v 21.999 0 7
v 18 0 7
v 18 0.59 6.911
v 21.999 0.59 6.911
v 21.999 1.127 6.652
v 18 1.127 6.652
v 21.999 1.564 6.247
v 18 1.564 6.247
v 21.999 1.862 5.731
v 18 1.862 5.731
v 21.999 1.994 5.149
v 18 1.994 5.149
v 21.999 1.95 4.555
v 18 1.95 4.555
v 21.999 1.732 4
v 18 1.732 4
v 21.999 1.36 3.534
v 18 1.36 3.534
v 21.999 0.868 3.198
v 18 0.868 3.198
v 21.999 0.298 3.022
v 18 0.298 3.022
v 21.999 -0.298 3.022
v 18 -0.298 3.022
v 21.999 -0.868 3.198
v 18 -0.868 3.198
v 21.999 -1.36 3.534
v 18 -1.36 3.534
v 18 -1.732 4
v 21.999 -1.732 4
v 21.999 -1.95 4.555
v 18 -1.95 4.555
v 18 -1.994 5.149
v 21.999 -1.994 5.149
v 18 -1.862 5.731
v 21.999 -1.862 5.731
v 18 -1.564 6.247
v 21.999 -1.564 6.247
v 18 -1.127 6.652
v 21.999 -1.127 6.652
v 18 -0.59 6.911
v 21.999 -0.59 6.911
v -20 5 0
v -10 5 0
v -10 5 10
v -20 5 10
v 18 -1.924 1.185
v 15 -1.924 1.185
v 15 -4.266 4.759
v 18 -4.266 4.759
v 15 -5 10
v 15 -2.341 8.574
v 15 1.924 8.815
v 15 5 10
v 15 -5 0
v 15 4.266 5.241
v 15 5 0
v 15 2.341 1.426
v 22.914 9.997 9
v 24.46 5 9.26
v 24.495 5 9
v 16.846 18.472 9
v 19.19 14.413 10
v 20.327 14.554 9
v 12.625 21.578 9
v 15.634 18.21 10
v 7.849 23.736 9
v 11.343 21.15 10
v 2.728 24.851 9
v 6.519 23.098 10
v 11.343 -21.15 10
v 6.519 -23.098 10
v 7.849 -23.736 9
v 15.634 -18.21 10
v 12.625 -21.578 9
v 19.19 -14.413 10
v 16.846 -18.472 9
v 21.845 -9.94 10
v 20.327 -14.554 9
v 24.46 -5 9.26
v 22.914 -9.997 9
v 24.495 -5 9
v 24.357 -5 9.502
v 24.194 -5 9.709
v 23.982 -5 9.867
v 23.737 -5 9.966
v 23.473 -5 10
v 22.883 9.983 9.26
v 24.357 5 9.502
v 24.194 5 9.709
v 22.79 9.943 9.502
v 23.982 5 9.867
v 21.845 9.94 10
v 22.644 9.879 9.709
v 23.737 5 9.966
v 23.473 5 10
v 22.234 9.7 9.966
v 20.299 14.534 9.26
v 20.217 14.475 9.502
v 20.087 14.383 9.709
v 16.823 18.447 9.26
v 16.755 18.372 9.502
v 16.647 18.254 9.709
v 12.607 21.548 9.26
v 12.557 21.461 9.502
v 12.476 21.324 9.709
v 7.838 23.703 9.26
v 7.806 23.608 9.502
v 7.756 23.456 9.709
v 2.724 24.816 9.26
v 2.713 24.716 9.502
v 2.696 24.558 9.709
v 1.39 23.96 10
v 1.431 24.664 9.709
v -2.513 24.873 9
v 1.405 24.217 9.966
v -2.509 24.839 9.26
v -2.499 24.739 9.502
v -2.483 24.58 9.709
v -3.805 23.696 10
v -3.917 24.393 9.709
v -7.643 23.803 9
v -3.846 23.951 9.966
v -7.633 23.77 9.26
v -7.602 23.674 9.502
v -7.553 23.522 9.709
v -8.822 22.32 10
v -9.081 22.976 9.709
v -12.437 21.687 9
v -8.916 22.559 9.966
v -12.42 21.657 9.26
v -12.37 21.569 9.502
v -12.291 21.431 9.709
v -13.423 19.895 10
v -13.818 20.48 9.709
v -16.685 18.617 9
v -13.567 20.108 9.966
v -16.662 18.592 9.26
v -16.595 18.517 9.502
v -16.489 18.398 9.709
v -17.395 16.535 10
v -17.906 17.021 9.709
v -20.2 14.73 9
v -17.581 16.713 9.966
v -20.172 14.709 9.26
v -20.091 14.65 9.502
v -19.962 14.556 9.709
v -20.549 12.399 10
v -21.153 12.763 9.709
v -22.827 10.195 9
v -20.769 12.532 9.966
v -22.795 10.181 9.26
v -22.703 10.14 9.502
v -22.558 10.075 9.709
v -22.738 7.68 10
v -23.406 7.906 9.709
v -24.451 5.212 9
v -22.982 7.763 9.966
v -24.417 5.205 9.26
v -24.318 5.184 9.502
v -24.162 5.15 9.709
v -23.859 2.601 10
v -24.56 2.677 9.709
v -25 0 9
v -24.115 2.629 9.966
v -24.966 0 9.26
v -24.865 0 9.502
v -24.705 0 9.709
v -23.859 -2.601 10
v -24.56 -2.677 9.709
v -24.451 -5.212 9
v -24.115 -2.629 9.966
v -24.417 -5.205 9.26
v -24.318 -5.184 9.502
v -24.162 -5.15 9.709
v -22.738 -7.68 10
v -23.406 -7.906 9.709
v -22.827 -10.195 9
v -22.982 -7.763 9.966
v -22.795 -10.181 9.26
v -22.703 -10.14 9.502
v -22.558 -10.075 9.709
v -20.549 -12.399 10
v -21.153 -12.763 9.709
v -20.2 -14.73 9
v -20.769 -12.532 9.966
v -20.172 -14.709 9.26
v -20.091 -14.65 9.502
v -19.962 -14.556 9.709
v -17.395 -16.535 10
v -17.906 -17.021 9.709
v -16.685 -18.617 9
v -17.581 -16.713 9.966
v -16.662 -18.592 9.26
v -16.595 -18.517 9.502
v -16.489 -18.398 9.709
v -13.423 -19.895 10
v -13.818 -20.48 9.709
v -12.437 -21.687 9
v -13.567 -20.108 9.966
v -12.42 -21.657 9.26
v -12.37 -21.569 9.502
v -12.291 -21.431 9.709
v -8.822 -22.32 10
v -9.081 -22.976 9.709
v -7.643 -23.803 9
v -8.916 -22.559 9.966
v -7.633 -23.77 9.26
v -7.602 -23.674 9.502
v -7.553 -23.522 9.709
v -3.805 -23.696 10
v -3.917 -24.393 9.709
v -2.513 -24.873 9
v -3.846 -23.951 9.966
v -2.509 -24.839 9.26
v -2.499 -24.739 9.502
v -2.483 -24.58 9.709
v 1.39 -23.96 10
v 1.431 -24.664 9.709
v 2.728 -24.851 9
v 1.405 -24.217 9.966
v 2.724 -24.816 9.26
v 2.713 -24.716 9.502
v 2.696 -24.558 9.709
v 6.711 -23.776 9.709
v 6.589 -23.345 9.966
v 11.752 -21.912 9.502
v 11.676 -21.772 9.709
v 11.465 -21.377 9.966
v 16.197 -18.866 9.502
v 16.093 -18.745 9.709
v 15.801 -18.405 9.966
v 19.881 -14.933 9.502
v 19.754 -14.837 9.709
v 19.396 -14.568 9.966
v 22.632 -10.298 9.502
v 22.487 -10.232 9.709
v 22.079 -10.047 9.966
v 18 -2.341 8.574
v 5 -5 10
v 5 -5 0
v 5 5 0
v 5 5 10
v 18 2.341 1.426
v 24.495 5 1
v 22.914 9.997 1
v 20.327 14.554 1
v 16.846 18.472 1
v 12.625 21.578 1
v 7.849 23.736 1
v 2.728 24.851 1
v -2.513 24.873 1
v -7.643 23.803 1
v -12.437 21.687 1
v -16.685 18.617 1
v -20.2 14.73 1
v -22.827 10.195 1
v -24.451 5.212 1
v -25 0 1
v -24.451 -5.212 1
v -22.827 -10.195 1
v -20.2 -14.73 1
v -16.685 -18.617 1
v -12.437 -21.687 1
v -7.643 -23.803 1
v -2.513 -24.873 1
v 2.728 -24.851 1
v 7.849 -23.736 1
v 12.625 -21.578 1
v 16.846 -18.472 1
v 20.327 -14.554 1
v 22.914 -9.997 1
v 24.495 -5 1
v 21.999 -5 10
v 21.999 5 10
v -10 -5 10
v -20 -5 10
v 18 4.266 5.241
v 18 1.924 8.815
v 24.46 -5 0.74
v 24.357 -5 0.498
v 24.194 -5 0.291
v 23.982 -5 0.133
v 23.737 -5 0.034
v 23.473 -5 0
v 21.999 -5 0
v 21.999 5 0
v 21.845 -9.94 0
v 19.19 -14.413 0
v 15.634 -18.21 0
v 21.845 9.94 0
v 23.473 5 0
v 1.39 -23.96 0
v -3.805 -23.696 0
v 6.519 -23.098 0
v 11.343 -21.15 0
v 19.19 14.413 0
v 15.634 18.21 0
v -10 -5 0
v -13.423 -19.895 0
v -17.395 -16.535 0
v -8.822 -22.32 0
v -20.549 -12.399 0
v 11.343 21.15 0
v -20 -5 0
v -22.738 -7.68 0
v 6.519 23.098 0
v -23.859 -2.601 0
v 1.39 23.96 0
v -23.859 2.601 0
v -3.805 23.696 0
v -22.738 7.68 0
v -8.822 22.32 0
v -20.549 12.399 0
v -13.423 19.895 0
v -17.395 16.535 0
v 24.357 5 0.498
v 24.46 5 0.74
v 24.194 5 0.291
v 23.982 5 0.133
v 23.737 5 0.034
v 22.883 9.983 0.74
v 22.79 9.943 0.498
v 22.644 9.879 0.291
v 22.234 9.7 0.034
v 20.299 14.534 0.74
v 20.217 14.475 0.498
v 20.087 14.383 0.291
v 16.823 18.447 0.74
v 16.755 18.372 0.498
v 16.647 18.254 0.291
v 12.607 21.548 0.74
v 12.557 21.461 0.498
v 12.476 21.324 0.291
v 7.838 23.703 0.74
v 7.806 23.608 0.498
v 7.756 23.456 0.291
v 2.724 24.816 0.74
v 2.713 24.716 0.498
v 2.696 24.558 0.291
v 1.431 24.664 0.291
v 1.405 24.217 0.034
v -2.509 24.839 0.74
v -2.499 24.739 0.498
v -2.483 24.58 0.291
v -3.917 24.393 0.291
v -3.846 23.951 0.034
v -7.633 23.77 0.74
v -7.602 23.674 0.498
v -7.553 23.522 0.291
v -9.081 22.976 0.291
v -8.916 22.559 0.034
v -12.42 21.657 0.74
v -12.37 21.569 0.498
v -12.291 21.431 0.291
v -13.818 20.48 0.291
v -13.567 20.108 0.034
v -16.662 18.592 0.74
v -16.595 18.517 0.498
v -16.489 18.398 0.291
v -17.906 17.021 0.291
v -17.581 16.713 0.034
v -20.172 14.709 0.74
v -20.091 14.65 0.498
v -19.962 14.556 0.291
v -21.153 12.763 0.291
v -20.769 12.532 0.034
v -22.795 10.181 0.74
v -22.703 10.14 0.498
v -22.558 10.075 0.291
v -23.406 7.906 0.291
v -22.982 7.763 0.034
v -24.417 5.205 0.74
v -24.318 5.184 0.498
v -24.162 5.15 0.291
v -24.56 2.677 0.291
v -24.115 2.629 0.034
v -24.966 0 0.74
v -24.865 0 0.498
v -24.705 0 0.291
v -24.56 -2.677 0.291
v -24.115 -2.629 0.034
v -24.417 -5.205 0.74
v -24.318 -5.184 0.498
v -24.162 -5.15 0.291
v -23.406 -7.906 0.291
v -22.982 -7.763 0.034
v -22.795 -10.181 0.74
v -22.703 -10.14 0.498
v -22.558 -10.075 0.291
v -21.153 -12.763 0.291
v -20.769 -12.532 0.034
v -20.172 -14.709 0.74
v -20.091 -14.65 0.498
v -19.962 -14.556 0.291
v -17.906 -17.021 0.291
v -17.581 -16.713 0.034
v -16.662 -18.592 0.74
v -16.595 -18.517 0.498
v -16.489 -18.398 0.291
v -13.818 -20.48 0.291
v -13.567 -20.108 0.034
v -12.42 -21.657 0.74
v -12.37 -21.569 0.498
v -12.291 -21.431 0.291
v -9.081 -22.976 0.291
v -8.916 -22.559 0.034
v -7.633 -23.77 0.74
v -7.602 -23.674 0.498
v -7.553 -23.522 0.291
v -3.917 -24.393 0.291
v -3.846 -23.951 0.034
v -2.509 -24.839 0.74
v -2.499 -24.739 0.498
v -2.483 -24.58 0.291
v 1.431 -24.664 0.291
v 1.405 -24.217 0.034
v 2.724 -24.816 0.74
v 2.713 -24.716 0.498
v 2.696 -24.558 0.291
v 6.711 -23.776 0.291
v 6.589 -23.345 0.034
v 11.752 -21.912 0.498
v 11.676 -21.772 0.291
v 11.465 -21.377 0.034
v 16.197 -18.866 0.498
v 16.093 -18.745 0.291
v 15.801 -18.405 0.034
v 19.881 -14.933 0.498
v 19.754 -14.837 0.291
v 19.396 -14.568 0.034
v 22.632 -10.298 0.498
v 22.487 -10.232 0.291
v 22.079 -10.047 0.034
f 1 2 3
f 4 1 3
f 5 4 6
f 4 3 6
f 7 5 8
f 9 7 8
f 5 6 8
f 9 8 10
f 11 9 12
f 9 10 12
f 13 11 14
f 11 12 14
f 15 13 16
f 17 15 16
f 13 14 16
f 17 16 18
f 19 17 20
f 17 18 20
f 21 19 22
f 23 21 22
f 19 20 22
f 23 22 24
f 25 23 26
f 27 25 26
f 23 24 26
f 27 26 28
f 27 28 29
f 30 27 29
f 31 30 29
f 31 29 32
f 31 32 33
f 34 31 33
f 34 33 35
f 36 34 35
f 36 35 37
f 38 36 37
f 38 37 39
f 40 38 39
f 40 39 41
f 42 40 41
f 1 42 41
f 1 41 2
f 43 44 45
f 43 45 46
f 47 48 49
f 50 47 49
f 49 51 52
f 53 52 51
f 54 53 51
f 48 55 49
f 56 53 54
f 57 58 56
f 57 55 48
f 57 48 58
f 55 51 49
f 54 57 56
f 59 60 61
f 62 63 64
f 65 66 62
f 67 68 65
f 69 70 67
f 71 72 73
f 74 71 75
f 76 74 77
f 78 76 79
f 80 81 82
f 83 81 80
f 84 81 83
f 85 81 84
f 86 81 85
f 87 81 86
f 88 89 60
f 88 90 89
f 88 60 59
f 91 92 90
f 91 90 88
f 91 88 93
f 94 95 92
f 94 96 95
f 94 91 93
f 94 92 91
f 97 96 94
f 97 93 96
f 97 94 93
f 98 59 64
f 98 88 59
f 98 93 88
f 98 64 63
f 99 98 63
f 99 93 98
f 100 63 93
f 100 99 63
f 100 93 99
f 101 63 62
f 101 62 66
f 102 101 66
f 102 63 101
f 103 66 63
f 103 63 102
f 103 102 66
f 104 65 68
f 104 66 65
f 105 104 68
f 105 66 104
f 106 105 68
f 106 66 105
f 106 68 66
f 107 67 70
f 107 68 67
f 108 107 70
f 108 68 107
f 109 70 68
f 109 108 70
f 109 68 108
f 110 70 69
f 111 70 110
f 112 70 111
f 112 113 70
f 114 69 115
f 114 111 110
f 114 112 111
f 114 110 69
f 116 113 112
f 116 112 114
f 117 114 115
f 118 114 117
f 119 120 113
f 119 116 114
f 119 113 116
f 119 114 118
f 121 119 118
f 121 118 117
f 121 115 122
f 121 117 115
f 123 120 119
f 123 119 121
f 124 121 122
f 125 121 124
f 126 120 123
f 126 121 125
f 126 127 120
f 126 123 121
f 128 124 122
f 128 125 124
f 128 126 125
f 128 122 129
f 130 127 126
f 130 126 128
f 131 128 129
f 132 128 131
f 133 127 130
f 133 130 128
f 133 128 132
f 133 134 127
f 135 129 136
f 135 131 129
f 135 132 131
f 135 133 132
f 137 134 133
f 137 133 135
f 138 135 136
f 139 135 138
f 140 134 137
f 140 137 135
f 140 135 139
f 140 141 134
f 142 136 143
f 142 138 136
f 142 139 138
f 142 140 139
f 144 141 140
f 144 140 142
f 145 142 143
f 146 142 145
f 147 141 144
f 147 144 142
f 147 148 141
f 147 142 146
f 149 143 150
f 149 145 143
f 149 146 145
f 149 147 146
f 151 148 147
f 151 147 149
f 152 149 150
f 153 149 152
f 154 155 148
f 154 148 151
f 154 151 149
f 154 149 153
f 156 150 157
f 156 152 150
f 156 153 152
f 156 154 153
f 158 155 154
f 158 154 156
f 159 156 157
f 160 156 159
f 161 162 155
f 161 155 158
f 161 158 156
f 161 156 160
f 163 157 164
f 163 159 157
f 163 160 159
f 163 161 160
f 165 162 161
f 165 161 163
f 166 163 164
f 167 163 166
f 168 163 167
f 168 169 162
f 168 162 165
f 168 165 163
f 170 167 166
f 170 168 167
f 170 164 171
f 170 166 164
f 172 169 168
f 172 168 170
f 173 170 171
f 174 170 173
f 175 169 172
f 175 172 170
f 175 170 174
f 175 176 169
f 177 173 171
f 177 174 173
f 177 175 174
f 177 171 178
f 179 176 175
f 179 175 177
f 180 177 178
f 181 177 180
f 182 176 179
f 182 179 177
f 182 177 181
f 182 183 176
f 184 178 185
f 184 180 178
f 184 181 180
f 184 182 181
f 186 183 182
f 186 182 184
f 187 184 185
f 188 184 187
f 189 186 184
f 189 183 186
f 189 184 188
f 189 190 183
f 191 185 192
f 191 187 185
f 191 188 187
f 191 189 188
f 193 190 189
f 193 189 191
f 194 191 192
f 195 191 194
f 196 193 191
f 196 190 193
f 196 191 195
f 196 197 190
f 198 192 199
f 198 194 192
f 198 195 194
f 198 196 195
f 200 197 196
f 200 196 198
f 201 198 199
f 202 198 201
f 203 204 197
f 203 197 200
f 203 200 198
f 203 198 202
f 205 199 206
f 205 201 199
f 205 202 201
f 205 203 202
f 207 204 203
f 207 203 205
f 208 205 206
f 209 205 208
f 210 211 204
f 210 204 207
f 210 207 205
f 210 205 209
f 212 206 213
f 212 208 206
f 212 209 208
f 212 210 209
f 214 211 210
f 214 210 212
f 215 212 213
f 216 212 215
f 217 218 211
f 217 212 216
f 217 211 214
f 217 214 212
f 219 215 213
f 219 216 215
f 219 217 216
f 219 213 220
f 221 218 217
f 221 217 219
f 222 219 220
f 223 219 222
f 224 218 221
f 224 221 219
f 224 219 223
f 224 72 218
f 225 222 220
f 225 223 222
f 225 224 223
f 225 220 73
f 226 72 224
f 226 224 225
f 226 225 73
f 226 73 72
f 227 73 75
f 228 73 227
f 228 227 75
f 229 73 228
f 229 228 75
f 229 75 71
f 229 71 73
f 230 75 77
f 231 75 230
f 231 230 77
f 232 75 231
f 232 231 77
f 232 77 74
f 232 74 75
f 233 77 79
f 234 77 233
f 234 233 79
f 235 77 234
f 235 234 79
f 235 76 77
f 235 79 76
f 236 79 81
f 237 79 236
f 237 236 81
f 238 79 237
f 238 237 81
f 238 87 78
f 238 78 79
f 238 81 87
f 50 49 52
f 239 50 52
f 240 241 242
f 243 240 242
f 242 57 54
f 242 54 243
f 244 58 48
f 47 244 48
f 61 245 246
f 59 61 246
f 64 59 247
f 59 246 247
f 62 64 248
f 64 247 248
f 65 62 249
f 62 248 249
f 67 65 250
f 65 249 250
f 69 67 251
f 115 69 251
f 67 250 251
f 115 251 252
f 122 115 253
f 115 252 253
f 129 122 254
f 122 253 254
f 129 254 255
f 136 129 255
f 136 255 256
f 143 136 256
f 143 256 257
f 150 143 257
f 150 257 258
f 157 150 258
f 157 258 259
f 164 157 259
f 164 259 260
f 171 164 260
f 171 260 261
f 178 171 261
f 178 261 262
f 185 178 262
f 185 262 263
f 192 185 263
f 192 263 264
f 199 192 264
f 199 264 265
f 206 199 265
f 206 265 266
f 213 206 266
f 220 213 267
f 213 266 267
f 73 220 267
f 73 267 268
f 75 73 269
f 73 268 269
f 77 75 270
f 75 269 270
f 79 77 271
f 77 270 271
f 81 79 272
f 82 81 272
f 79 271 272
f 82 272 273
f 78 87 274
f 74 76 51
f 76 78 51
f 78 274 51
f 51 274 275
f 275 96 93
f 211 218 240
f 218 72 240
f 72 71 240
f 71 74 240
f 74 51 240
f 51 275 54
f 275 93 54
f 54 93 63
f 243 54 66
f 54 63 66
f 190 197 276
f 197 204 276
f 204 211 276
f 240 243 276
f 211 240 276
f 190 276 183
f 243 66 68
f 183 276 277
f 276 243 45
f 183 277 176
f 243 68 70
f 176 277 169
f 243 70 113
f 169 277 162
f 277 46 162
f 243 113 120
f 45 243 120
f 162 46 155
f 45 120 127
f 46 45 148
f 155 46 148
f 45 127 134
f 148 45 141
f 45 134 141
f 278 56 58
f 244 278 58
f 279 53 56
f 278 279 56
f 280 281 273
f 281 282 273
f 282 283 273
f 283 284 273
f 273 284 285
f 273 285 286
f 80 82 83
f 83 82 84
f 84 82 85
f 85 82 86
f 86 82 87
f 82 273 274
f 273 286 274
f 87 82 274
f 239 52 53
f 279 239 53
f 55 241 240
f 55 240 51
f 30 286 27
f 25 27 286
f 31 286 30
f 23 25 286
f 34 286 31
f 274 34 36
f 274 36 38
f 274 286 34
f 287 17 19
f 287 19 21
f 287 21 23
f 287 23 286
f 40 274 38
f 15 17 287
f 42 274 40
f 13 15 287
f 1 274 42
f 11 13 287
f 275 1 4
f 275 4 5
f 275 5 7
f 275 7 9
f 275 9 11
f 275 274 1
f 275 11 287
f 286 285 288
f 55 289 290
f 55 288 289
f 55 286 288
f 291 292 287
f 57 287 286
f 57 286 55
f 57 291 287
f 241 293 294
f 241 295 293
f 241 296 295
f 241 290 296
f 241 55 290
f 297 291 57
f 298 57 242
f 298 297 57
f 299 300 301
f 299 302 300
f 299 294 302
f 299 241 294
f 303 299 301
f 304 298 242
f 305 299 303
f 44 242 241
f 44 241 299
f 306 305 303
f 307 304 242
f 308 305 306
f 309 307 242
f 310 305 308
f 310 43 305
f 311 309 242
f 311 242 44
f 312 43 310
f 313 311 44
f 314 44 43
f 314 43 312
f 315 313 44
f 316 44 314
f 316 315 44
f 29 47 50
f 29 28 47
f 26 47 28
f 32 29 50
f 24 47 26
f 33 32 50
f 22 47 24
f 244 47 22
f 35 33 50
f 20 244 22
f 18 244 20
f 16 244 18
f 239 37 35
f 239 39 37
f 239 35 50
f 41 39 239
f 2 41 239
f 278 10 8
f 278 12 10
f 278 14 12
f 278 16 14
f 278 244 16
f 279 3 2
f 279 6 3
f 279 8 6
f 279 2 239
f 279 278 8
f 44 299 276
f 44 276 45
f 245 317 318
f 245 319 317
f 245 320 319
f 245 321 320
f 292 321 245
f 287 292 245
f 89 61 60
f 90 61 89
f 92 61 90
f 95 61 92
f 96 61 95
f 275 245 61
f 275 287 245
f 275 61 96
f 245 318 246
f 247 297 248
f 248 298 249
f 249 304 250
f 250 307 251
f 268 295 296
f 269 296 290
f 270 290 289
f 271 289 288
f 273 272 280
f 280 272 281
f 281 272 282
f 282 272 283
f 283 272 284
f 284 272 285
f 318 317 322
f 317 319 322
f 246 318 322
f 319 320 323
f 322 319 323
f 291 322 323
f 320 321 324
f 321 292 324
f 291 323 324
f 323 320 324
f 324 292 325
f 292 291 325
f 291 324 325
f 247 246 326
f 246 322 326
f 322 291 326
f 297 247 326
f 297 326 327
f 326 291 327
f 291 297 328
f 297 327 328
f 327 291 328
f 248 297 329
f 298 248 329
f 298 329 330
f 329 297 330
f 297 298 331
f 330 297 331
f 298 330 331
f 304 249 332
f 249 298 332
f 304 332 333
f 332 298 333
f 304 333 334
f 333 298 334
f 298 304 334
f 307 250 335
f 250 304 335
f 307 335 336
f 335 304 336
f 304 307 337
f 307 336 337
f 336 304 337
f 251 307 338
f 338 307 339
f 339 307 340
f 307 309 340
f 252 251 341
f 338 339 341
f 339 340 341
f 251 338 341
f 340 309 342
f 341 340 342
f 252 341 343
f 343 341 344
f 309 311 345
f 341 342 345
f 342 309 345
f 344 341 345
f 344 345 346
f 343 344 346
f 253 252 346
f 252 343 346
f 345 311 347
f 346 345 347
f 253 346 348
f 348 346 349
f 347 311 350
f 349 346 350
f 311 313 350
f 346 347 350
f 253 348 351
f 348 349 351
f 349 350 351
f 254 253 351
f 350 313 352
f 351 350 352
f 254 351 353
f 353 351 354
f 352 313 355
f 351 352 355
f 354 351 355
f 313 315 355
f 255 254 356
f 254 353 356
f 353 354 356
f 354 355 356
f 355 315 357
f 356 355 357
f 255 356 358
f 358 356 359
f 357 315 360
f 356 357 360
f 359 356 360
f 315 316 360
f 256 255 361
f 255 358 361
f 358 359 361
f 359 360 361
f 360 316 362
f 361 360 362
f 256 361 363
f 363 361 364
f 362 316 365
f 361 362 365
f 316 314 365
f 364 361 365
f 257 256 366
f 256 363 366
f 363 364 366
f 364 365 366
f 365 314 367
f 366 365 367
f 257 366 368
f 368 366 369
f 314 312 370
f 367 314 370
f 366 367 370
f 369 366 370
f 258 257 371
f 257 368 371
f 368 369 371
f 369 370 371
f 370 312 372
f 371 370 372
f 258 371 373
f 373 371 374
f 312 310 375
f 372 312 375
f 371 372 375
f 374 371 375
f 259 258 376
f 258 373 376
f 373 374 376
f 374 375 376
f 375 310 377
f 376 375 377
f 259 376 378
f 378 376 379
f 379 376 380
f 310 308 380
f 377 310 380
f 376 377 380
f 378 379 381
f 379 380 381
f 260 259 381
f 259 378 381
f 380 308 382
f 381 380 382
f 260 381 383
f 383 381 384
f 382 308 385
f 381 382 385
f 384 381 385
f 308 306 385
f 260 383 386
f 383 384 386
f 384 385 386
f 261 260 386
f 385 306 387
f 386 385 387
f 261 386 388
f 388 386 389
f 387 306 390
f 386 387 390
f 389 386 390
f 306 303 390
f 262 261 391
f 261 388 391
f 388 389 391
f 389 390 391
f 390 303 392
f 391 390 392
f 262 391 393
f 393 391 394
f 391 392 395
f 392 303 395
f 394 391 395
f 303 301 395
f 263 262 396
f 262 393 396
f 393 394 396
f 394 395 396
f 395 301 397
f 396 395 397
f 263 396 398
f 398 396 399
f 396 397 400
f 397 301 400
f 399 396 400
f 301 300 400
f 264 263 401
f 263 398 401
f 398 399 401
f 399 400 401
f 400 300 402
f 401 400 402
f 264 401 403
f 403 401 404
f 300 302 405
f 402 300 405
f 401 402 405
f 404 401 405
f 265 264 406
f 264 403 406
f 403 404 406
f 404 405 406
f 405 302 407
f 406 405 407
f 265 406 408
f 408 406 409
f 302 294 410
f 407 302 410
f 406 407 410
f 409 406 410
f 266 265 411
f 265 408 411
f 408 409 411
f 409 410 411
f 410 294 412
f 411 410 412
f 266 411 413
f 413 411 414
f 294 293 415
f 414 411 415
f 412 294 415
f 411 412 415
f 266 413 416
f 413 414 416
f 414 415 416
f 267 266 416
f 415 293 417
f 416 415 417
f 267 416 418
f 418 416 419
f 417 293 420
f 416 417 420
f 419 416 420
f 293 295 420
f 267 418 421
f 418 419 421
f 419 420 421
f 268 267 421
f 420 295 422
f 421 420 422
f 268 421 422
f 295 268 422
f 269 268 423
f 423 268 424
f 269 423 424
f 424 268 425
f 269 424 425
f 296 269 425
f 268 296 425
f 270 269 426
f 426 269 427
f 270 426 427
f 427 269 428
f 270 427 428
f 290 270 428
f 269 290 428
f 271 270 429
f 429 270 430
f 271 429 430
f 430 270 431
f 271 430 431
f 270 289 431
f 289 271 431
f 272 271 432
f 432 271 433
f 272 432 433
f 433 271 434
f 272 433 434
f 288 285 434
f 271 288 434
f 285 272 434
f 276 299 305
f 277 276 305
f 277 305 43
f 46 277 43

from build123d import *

# Parameters (mm, degrees)
SKETCH1_R               = 25
BOSS_EXTRUDE1_DEPTH     = 10
CUT_EXTRUDE1_DEPTH      = 37.742346142
CUT_EXTRUDE1_DEPTH_BACK = 37.742346142
CUT_EXTRUDE2_DEPTH      = 3
SKETCH5_R               = 2
CUT_EXTRUDE4_DEPTH      = 13
FILLET1_R               = 1
CUT_EXTRUDE6_DEPTH      = 3
CUT_EXTRUDE6_DEPTH_BACK = 3
SKETCH6_W               = 10
SKETCH6_H               = 10
SKETCH7_W               = 10
SKETCH7_H               = 30
BOSS_EXTRUDE2_DEPTH     = 10
SKETCH8_W               = 10
SKETCH8_H               = 10
BOSS_EXTRUDE3_DEPTH     = 10
SKETCH9_W               = 10
SKETCH9_H               = 10
CUT_EXTRUDE7_DEPTH      = 10


with BuildPart() as part:
    # Sketch1 → Boss-Extrude1 (new body)
    with BuildSketch(Plane.XY):
        Circle(SKETCH1_R)
    extrude(amount=BOSS_EXTRUDE1_DEPTH)

    # Sketch2 → Cut-Extrude1 (cut, two sides: drawn at the far end of the back side and taken through both)
    with BuildSketch(Plane.XY.offset(10).offset(-CUT_EXTRUDE1_DEPTH_BACK)):
        Polygon((5, -5), (15, -5), (15, 5), (5, 5), (5, 15), (-5, 15), (-5, 5), (-15, 5), (-15, -5), (-5, -5), (-5, -15), (5, -15), align=None)
    extrude(amount=CUT_EXTRUDE1_DEPTH + CUT_EXTRUDE1_DEPTH_BACK, mode=Mode.SUBTRACT)

    # Sketch4 → Cut-Extrude2 (cut)
    with BuildSketch(Plane.ZY.offset(-15)):
        Polygon((4.759098318, -4.265594884), (8.57366269, -2.341424419), (8.814564373, 1.924170465), (5.240901682, 4.265594884), (1.42633731, 2.341424419), (1.185435627, -1.924170465), align=None)
    extrude(amount=-CUT_EXTRUDE2_DEPTH, mode=Mode.SUBTRACT)

    # Sketch5 → Cut-Extrude4 (cut)
    with BuildSketch(Plane.ZY.offset(-18)):
        with Locations((5, 0)):
            Circle(SKETCH5_R)
    extrude(amount=-CUT_EXTRUDE4_DEPTH, mode=Mode.SUBTRACT)

    # Fillet1
    fillet1_edges = [part.edges().sort_by_distance(p)[0] for p in [
        (-25, 0, 0),
        (-25, 0, 10),
    ]]
    fillet(fillet1_edges, radius=FILLET1_R)

    # Sketch6 → Cut-Extrude6 (cut, two sides: drawn at the far end of the back side and taken through both)
    with BuildSketch(Plane.YZ.offset(24.999151456).offset(-CUT_EXTRUDE6_DEPTH_BACK)):
        with Locations((0, 5)):
            Rectangle(SKETCH6_W, SKETCH6_H)
    extrude(amount=CUT_EXTRUDE6_DEPTH + CUT_EXTRUDE6_DEPTH_BACK, mode=Mode.SUBTRACT)

    # Sketch7 → Boss-Extrude2 (add)
    with BuildSketch(Plane(origin=(0, 0, 0), x_dir=(-1, 0, 0), z_dir=(0, 0, -1))):
        Rectangle(SKETCH7_W, SKETCH7_H)
    extrude(amount=-BOSS_EXTRUDE2_DEPTH)

    # Sketch8 → Boss-Extrude3 (add)
    with BuildSketch(Plane(origin=(0, 0, 0), x_dir=(-1, 0, 0), z_dir=(0, 0, -1))):
        with Locations((10, 0)):
            Rectangle(SKETCH8_W, SKETCH8_H)
    extrude(amount=-BOSS_EXTRUDE3_DEPTH)

    # Sketch9 → Cut-Extrude7 (cut)
    with BuildSketch(Plane(origin=(0, 0, 0), x_dir=(-1, 0, 0), z_dir=(0, 0, -1))):
        with Locations((15, 0)):
            Rectangle(SKETCH9_W, SKETCH9_H)
    extrude(amount=-CUT_EXTRUDE7_DEPTH, mode=Mode.SUBTRACT)


solid = part.part
